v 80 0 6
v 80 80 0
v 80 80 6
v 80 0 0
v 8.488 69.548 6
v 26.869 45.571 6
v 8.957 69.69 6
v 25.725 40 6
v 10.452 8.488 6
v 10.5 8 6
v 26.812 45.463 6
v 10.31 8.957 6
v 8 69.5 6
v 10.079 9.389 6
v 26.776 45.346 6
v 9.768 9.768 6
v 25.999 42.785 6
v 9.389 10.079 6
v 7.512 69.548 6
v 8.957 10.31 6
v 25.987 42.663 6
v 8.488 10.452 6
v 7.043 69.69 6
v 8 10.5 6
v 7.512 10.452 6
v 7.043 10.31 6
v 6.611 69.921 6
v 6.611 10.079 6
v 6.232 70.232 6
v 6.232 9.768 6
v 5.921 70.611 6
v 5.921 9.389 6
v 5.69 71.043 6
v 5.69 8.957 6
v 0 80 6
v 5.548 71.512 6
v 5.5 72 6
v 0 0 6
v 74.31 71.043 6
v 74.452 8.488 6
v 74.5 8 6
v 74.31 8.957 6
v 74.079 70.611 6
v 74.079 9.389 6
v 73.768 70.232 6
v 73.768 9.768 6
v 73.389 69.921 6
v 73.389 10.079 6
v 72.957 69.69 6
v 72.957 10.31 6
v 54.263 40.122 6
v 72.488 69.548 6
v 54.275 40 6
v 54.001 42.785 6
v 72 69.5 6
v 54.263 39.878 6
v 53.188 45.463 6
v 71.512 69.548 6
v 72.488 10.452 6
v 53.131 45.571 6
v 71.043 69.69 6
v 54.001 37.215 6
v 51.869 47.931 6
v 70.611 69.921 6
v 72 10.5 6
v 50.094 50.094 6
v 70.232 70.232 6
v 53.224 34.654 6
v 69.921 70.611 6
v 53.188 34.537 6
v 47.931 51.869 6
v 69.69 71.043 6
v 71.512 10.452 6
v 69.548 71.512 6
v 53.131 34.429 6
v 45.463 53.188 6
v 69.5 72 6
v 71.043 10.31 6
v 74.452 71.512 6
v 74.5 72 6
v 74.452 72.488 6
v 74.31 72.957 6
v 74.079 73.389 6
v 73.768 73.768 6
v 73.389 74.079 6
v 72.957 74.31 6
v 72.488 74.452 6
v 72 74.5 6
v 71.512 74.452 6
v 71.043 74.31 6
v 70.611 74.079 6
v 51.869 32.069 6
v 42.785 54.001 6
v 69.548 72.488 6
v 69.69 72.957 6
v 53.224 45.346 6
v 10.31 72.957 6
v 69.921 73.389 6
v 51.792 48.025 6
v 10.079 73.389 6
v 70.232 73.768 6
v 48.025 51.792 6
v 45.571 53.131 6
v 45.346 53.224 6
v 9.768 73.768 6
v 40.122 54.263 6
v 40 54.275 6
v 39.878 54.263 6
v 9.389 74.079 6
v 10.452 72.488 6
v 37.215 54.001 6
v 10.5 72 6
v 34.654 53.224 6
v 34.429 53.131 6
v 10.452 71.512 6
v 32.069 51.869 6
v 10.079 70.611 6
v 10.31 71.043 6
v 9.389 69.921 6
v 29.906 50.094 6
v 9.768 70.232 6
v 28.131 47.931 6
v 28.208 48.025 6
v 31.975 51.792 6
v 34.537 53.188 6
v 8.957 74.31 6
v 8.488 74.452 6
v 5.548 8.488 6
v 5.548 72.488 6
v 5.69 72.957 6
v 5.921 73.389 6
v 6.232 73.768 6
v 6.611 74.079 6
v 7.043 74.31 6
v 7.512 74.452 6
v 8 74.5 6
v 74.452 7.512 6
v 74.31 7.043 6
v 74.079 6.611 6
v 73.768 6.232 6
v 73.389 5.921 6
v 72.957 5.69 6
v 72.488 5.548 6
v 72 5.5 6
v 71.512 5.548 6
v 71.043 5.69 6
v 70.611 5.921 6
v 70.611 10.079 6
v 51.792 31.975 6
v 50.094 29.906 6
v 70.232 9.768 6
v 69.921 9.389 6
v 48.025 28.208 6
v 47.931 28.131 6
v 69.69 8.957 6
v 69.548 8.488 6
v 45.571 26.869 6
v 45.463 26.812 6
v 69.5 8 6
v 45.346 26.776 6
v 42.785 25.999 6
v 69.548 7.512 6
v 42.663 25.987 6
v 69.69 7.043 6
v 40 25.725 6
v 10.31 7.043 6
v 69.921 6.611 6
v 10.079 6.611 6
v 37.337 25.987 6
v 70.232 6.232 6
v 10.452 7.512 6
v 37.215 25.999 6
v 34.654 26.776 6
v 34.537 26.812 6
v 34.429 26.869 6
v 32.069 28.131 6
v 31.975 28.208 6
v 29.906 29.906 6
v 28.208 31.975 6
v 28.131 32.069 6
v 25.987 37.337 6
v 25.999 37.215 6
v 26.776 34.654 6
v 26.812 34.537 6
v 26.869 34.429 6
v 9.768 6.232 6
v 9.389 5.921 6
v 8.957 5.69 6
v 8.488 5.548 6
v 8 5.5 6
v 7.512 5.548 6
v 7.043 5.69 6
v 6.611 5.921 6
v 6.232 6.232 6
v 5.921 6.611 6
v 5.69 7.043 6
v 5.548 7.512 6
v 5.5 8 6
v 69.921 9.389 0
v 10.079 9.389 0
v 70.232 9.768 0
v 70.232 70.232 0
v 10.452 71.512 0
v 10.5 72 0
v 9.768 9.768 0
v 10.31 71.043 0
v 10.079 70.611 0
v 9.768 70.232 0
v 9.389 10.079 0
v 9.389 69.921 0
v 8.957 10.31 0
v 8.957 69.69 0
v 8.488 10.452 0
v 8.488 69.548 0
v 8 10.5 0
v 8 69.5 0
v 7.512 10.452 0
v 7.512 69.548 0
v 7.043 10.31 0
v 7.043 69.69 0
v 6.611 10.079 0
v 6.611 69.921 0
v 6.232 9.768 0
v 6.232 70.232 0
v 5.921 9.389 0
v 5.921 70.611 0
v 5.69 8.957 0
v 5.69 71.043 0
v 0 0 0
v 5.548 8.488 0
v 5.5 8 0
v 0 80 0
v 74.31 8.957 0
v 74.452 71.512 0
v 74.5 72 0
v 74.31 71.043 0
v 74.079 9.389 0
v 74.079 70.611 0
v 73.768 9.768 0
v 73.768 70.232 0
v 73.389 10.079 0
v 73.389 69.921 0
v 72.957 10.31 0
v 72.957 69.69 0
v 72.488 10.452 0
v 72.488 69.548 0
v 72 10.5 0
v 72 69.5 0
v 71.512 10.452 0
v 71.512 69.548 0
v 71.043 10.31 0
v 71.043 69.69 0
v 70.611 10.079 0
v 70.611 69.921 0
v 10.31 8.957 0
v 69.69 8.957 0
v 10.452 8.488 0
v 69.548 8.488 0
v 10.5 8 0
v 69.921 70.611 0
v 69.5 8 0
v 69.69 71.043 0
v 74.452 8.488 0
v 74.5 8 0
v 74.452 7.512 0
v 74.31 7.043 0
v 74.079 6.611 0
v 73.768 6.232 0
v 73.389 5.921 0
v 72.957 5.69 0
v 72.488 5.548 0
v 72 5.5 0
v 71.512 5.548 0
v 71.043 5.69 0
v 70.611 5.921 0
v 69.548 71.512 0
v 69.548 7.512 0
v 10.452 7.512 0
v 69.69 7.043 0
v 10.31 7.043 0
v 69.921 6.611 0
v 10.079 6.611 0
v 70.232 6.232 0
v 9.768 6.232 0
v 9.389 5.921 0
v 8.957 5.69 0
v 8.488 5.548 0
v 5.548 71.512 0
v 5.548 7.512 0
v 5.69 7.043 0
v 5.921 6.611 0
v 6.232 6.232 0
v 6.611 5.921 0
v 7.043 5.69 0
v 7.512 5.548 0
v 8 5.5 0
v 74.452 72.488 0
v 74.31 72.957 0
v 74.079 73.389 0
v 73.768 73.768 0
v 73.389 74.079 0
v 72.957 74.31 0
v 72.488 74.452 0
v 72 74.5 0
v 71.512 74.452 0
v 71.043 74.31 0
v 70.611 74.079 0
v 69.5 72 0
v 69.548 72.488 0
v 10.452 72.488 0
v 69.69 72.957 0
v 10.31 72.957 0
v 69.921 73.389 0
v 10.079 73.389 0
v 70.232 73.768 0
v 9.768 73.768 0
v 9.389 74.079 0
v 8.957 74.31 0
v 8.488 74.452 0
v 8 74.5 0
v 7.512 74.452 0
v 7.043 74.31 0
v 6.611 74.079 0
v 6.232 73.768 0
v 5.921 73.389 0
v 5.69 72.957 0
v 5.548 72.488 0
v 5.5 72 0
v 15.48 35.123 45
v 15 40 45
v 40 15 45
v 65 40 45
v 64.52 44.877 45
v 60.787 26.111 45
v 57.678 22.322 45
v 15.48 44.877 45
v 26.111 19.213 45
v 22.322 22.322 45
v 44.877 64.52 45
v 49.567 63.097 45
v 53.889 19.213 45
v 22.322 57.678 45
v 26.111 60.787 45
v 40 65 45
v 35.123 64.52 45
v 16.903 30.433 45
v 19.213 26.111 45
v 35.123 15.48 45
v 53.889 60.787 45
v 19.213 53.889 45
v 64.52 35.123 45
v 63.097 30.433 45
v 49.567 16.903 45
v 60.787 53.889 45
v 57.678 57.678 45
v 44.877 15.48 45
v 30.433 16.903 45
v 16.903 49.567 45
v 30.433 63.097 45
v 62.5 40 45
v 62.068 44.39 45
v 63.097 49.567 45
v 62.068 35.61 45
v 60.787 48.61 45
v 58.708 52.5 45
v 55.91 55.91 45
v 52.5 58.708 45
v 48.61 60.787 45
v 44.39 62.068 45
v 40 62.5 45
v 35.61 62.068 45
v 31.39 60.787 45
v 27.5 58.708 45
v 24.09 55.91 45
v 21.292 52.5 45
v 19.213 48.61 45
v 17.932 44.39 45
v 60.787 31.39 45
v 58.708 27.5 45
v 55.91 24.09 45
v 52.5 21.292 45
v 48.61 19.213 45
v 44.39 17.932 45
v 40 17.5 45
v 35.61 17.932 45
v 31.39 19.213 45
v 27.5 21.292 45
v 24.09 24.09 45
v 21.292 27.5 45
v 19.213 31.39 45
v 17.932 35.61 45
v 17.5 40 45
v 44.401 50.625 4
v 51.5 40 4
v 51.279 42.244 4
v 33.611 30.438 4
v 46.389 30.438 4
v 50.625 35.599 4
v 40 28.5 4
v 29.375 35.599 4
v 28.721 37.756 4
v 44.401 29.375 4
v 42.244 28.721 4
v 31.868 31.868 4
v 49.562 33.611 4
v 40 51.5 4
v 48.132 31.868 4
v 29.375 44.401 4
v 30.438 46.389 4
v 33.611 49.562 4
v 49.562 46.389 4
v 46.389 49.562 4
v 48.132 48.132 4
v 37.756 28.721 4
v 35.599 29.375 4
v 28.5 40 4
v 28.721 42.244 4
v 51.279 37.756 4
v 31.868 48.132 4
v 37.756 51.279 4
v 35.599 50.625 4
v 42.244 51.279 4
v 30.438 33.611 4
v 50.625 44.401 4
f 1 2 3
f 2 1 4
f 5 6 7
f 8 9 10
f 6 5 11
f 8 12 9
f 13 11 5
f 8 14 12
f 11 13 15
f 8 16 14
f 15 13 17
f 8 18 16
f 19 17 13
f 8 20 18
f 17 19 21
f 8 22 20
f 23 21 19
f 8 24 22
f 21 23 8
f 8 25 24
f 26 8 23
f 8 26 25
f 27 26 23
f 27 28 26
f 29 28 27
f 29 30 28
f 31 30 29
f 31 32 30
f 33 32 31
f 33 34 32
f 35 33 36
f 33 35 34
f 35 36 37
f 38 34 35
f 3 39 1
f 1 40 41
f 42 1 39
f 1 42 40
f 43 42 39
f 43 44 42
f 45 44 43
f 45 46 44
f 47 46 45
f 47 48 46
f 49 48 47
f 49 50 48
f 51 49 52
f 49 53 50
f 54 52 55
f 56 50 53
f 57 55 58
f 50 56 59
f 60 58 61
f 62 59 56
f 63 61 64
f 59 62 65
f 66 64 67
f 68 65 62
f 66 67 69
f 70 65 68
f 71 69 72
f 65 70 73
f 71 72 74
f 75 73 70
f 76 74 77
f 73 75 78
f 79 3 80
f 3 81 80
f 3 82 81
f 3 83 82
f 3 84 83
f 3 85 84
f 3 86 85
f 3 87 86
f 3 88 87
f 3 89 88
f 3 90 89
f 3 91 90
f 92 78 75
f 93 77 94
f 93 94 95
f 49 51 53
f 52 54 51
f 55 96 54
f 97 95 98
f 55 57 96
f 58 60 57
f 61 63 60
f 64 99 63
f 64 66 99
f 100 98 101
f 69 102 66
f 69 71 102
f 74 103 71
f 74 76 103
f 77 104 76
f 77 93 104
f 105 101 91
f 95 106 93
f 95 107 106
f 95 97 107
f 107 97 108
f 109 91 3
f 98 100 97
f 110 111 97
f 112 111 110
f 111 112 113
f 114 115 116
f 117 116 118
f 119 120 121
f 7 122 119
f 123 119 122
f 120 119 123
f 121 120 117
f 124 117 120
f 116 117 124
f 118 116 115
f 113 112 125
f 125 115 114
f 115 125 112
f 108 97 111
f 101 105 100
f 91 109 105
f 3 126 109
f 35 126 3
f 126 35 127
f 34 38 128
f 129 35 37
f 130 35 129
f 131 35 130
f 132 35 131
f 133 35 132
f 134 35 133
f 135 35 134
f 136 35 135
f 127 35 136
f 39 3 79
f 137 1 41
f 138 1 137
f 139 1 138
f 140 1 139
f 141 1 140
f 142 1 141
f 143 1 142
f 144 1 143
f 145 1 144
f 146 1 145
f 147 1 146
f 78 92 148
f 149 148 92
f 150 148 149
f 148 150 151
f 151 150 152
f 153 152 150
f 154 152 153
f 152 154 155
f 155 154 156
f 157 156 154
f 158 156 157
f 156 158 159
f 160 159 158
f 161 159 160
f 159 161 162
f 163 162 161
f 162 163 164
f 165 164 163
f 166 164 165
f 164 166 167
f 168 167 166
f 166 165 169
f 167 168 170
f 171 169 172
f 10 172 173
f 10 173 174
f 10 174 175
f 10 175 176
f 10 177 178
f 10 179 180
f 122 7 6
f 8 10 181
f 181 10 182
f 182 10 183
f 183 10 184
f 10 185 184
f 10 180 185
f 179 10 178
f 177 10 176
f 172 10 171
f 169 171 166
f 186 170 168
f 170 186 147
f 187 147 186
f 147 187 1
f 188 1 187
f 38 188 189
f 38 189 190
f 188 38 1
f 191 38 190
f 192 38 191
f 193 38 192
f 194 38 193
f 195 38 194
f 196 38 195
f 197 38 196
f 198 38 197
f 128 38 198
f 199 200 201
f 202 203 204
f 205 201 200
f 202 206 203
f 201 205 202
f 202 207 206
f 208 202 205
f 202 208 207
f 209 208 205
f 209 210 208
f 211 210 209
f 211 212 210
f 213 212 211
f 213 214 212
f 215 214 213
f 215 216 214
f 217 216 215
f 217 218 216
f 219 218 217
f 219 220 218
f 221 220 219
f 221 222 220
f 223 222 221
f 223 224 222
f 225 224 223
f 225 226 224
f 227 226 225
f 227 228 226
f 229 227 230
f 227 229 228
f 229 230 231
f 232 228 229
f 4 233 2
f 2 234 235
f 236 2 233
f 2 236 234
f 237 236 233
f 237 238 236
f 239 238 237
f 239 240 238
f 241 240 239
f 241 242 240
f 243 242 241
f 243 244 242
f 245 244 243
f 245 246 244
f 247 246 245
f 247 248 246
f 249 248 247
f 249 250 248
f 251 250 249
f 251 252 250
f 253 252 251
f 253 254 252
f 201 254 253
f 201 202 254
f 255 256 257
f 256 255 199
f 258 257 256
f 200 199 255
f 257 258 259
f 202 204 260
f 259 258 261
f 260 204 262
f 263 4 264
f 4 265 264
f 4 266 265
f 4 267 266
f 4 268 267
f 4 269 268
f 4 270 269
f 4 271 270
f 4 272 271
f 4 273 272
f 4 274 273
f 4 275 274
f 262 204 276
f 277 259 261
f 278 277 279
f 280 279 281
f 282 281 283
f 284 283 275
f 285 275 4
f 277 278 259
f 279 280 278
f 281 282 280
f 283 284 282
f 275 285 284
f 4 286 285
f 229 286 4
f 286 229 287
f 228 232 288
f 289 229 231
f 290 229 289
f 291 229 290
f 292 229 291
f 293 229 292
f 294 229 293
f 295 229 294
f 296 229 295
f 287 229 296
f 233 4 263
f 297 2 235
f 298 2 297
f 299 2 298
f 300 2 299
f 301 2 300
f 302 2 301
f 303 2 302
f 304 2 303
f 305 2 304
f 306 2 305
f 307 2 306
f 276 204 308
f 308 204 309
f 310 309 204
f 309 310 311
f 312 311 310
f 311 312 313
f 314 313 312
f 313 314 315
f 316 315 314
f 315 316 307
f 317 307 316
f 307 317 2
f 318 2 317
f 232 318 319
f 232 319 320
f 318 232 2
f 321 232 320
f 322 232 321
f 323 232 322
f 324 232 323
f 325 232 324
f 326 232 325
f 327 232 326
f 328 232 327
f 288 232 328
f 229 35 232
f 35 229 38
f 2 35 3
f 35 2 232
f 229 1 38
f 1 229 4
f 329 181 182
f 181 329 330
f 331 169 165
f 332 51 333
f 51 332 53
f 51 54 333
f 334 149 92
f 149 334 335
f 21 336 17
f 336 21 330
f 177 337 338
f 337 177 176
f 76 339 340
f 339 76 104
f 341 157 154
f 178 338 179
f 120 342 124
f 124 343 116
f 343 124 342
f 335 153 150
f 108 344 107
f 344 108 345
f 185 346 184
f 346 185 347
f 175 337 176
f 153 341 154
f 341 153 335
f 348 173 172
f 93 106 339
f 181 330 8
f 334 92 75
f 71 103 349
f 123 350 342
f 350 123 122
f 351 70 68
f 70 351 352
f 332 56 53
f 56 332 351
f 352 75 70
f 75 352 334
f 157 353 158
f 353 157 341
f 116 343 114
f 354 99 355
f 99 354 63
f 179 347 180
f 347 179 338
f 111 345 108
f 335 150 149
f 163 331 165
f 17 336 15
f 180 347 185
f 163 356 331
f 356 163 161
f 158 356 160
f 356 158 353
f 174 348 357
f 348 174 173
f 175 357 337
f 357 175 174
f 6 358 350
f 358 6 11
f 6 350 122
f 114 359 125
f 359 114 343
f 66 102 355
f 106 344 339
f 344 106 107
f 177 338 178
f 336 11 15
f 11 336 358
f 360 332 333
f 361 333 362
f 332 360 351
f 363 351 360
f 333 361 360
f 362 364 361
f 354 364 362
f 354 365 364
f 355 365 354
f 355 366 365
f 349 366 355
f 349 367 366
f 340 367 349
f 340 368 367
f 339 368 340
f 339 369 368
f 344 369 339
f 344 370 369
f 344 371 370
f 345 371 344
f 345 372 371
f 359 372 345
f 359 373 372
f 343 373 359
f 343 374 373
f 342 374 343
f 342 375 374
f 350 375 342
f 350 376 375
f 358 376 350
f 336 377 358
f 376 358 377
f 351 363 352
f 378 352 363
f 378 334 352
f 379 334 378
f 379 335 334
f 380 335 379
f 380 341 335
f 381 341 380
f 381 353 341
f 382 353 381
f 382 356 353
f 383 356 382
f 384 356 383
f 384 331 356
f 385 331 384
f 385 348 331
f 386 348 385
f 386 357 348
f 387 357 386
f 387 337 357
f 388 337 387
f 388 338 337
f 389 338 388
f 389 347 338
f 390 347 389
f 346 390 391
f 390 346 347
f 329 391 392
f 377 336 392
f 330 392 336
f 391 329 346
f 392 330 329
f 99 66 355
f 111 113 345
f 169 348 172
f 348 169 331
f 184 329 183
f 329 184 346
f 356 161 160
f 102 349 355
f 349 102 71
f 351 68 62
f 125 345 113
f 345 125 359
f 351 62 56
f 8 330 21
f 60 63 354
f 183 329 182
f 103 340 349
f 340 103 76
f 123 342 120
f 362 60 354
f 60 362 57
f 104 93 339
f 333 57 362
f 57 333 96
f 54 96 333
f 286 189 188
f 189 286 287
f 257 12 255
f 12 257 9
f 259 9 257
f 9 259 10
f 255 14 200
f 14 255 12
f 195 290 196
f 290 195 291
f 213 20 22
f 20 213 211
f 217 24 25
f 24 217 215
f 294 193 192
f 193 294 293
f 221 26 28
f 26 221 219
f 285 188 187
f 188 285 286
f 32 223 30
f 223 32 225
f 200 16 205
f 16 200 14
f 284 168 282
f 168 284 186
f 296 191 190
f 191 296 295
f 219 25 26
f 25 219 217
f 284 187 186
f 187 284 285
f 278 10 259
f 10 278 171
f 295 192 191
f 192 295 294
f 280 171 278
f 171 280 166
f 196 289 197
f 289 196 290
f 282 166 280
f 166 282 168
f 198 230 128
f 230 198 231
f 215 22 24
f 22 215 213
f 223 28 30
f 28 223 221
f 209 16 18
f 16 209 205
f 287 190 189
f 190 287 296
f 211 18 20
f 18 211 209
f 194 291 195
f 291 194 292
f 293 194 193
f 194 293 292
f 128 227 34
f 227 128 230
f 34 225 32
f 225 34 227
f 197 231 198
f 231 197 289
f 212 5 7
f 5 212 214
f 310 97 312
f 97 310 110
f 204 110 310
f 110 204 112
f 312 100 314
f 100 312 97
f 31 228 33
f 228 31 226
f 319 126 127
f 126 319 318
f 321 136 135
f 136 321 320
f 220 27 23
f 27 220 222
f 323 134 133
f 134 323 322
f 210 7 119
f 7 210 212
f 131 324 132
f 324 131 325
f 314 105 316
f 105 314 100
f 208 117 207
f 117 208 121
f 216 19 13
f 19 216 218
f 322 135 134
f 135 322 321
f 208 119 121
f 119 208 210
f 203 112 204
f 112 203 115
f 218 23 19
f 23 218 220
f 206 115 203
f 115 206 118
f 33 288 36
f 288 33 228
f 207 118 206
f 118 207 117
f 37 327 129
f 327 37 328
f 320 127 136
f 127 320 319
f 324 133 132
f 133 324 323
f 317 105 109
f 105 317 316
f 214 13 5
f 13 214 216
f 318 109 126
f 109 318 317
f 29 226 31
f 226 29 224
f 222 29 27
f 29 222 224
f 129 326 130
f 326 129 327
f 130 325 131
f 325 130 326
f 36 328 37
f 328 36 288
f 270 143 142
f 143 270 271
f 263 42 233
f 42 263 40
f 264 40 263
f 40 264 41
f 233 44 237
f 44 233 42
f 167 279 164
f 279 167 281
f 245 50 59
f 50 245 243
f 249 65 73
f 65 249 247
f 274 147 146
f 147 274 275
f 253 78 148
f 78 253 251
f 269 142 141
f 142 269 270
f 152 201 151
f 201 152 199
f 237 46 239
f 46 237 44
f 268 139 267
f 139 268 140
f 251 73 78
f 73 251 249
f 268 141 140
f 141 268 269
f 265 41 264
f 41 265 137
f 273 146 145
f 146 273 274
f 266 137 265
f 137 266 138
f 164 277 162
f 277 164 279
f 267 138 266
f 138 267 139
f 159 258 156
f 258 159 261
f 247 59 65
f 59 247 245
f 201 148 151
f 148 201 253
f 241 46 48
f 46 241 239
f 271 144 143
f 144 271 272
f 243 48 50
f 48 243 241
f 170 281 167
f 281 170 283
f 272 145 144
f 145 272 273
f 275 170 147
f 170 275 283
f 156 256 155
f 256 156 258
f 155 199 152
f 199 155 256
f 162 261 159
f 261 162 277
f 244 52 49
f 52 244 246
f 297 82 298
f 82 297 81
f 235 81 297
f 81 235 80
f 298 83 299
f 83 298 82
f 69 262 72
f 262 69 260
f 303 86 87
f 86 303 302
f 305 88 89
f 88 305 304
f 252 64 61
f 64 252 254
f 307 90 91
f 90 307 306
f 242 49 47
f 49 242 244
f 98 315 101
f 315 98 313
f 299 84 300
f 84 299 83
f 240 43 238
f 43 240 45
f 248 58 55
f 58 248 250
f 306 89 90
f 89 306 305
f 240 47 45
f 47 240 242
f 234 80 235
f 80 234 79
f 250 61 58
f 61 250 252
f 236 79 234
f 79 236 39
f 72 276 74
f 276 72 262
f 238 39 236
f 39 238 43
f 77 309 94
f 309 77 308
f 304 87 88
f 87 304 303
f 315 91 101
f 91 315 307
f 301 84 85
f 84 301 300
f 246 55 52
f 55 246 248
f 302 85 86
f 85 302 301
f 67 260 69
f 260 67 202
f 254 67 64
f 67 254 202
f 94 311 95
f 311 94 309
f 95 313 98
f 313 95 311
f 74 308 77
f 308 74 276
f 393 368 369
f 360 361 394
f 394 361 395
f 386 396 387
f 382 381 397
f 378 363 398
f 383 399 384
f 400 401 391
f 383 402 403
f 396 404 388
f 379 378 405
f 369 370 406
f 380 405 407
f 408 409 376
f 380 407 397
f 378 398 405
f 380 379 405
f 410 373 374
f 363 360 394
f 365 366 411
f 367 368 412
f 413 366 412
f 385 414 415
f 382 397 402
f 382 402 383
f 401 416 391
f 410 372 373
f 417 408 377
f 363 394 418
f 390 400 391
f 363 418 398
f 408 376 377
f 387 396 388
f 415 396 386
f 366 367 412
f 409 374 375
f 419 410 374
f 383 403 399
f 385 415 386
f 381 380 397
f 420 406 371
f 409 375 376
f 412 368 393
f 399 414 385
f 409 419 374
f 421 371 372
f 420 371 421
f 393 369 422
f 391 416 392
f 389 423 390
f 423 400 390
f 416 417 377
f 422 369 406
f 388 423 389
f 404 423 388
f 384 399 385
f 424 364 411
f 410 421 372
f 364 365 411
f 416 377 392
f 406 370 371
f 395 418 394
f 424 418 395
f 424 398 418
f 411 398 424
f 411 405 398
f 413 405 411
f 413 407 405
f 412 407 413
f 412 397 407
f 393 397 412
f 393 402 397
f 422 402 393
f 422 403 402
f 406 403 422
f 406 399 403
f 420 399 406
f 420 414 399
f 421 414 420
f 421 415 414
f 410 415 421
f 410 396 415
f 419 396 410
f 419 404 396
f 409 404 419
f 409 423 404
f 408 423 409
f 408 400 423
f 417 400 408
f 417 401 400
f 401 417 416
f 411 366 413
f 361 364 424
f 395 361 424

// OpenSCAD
$fn = 32;

// ----------------------------------------------------------------------
// Hopper: flanged with square flange
// ----------------------------------------------------------------------

// --- parameters (mm) ---
fl = 80;                  // flange side, X and Y
fl_t = 6;                 // flange thickness
cone_h = 40;              // cone height above the flange
top_d = 50;               // cone mouth diameter
bot_d = 28;               // cone spout diameter
wall = 2.5;               // cone wall thickness
hole_r = 2.5;             // flange hole radius
hole_in = 8;              // hole inset from the corners

bore_d = bot_d - 2 * wall;  // spout bore diameter
total_h = fl_t + cone_h - 1;  // overall height

difference() {
  union() {
    cube([fl, fl, fl_t]);
    translate([fl / 2, fl / 2, fl_t - 1])
      cylinder(h = cone_h, d1 = bot_d, d2 = top_d);
  }
  translate([fl / 2, fl / 2, fl_t - 2])
    cylinder(h = cone_h + 1, d1 = bore_d, d2 = top_d - 2 * wall);
  for (sx = [0, 1], sy = [0, 1])
    translate([sx ? fl - hole_in : hole_in,
               sy ? fl - hole_in : hole_in, -1])
      cylinder(r = hole_r, h = fl_t + 2);
}
